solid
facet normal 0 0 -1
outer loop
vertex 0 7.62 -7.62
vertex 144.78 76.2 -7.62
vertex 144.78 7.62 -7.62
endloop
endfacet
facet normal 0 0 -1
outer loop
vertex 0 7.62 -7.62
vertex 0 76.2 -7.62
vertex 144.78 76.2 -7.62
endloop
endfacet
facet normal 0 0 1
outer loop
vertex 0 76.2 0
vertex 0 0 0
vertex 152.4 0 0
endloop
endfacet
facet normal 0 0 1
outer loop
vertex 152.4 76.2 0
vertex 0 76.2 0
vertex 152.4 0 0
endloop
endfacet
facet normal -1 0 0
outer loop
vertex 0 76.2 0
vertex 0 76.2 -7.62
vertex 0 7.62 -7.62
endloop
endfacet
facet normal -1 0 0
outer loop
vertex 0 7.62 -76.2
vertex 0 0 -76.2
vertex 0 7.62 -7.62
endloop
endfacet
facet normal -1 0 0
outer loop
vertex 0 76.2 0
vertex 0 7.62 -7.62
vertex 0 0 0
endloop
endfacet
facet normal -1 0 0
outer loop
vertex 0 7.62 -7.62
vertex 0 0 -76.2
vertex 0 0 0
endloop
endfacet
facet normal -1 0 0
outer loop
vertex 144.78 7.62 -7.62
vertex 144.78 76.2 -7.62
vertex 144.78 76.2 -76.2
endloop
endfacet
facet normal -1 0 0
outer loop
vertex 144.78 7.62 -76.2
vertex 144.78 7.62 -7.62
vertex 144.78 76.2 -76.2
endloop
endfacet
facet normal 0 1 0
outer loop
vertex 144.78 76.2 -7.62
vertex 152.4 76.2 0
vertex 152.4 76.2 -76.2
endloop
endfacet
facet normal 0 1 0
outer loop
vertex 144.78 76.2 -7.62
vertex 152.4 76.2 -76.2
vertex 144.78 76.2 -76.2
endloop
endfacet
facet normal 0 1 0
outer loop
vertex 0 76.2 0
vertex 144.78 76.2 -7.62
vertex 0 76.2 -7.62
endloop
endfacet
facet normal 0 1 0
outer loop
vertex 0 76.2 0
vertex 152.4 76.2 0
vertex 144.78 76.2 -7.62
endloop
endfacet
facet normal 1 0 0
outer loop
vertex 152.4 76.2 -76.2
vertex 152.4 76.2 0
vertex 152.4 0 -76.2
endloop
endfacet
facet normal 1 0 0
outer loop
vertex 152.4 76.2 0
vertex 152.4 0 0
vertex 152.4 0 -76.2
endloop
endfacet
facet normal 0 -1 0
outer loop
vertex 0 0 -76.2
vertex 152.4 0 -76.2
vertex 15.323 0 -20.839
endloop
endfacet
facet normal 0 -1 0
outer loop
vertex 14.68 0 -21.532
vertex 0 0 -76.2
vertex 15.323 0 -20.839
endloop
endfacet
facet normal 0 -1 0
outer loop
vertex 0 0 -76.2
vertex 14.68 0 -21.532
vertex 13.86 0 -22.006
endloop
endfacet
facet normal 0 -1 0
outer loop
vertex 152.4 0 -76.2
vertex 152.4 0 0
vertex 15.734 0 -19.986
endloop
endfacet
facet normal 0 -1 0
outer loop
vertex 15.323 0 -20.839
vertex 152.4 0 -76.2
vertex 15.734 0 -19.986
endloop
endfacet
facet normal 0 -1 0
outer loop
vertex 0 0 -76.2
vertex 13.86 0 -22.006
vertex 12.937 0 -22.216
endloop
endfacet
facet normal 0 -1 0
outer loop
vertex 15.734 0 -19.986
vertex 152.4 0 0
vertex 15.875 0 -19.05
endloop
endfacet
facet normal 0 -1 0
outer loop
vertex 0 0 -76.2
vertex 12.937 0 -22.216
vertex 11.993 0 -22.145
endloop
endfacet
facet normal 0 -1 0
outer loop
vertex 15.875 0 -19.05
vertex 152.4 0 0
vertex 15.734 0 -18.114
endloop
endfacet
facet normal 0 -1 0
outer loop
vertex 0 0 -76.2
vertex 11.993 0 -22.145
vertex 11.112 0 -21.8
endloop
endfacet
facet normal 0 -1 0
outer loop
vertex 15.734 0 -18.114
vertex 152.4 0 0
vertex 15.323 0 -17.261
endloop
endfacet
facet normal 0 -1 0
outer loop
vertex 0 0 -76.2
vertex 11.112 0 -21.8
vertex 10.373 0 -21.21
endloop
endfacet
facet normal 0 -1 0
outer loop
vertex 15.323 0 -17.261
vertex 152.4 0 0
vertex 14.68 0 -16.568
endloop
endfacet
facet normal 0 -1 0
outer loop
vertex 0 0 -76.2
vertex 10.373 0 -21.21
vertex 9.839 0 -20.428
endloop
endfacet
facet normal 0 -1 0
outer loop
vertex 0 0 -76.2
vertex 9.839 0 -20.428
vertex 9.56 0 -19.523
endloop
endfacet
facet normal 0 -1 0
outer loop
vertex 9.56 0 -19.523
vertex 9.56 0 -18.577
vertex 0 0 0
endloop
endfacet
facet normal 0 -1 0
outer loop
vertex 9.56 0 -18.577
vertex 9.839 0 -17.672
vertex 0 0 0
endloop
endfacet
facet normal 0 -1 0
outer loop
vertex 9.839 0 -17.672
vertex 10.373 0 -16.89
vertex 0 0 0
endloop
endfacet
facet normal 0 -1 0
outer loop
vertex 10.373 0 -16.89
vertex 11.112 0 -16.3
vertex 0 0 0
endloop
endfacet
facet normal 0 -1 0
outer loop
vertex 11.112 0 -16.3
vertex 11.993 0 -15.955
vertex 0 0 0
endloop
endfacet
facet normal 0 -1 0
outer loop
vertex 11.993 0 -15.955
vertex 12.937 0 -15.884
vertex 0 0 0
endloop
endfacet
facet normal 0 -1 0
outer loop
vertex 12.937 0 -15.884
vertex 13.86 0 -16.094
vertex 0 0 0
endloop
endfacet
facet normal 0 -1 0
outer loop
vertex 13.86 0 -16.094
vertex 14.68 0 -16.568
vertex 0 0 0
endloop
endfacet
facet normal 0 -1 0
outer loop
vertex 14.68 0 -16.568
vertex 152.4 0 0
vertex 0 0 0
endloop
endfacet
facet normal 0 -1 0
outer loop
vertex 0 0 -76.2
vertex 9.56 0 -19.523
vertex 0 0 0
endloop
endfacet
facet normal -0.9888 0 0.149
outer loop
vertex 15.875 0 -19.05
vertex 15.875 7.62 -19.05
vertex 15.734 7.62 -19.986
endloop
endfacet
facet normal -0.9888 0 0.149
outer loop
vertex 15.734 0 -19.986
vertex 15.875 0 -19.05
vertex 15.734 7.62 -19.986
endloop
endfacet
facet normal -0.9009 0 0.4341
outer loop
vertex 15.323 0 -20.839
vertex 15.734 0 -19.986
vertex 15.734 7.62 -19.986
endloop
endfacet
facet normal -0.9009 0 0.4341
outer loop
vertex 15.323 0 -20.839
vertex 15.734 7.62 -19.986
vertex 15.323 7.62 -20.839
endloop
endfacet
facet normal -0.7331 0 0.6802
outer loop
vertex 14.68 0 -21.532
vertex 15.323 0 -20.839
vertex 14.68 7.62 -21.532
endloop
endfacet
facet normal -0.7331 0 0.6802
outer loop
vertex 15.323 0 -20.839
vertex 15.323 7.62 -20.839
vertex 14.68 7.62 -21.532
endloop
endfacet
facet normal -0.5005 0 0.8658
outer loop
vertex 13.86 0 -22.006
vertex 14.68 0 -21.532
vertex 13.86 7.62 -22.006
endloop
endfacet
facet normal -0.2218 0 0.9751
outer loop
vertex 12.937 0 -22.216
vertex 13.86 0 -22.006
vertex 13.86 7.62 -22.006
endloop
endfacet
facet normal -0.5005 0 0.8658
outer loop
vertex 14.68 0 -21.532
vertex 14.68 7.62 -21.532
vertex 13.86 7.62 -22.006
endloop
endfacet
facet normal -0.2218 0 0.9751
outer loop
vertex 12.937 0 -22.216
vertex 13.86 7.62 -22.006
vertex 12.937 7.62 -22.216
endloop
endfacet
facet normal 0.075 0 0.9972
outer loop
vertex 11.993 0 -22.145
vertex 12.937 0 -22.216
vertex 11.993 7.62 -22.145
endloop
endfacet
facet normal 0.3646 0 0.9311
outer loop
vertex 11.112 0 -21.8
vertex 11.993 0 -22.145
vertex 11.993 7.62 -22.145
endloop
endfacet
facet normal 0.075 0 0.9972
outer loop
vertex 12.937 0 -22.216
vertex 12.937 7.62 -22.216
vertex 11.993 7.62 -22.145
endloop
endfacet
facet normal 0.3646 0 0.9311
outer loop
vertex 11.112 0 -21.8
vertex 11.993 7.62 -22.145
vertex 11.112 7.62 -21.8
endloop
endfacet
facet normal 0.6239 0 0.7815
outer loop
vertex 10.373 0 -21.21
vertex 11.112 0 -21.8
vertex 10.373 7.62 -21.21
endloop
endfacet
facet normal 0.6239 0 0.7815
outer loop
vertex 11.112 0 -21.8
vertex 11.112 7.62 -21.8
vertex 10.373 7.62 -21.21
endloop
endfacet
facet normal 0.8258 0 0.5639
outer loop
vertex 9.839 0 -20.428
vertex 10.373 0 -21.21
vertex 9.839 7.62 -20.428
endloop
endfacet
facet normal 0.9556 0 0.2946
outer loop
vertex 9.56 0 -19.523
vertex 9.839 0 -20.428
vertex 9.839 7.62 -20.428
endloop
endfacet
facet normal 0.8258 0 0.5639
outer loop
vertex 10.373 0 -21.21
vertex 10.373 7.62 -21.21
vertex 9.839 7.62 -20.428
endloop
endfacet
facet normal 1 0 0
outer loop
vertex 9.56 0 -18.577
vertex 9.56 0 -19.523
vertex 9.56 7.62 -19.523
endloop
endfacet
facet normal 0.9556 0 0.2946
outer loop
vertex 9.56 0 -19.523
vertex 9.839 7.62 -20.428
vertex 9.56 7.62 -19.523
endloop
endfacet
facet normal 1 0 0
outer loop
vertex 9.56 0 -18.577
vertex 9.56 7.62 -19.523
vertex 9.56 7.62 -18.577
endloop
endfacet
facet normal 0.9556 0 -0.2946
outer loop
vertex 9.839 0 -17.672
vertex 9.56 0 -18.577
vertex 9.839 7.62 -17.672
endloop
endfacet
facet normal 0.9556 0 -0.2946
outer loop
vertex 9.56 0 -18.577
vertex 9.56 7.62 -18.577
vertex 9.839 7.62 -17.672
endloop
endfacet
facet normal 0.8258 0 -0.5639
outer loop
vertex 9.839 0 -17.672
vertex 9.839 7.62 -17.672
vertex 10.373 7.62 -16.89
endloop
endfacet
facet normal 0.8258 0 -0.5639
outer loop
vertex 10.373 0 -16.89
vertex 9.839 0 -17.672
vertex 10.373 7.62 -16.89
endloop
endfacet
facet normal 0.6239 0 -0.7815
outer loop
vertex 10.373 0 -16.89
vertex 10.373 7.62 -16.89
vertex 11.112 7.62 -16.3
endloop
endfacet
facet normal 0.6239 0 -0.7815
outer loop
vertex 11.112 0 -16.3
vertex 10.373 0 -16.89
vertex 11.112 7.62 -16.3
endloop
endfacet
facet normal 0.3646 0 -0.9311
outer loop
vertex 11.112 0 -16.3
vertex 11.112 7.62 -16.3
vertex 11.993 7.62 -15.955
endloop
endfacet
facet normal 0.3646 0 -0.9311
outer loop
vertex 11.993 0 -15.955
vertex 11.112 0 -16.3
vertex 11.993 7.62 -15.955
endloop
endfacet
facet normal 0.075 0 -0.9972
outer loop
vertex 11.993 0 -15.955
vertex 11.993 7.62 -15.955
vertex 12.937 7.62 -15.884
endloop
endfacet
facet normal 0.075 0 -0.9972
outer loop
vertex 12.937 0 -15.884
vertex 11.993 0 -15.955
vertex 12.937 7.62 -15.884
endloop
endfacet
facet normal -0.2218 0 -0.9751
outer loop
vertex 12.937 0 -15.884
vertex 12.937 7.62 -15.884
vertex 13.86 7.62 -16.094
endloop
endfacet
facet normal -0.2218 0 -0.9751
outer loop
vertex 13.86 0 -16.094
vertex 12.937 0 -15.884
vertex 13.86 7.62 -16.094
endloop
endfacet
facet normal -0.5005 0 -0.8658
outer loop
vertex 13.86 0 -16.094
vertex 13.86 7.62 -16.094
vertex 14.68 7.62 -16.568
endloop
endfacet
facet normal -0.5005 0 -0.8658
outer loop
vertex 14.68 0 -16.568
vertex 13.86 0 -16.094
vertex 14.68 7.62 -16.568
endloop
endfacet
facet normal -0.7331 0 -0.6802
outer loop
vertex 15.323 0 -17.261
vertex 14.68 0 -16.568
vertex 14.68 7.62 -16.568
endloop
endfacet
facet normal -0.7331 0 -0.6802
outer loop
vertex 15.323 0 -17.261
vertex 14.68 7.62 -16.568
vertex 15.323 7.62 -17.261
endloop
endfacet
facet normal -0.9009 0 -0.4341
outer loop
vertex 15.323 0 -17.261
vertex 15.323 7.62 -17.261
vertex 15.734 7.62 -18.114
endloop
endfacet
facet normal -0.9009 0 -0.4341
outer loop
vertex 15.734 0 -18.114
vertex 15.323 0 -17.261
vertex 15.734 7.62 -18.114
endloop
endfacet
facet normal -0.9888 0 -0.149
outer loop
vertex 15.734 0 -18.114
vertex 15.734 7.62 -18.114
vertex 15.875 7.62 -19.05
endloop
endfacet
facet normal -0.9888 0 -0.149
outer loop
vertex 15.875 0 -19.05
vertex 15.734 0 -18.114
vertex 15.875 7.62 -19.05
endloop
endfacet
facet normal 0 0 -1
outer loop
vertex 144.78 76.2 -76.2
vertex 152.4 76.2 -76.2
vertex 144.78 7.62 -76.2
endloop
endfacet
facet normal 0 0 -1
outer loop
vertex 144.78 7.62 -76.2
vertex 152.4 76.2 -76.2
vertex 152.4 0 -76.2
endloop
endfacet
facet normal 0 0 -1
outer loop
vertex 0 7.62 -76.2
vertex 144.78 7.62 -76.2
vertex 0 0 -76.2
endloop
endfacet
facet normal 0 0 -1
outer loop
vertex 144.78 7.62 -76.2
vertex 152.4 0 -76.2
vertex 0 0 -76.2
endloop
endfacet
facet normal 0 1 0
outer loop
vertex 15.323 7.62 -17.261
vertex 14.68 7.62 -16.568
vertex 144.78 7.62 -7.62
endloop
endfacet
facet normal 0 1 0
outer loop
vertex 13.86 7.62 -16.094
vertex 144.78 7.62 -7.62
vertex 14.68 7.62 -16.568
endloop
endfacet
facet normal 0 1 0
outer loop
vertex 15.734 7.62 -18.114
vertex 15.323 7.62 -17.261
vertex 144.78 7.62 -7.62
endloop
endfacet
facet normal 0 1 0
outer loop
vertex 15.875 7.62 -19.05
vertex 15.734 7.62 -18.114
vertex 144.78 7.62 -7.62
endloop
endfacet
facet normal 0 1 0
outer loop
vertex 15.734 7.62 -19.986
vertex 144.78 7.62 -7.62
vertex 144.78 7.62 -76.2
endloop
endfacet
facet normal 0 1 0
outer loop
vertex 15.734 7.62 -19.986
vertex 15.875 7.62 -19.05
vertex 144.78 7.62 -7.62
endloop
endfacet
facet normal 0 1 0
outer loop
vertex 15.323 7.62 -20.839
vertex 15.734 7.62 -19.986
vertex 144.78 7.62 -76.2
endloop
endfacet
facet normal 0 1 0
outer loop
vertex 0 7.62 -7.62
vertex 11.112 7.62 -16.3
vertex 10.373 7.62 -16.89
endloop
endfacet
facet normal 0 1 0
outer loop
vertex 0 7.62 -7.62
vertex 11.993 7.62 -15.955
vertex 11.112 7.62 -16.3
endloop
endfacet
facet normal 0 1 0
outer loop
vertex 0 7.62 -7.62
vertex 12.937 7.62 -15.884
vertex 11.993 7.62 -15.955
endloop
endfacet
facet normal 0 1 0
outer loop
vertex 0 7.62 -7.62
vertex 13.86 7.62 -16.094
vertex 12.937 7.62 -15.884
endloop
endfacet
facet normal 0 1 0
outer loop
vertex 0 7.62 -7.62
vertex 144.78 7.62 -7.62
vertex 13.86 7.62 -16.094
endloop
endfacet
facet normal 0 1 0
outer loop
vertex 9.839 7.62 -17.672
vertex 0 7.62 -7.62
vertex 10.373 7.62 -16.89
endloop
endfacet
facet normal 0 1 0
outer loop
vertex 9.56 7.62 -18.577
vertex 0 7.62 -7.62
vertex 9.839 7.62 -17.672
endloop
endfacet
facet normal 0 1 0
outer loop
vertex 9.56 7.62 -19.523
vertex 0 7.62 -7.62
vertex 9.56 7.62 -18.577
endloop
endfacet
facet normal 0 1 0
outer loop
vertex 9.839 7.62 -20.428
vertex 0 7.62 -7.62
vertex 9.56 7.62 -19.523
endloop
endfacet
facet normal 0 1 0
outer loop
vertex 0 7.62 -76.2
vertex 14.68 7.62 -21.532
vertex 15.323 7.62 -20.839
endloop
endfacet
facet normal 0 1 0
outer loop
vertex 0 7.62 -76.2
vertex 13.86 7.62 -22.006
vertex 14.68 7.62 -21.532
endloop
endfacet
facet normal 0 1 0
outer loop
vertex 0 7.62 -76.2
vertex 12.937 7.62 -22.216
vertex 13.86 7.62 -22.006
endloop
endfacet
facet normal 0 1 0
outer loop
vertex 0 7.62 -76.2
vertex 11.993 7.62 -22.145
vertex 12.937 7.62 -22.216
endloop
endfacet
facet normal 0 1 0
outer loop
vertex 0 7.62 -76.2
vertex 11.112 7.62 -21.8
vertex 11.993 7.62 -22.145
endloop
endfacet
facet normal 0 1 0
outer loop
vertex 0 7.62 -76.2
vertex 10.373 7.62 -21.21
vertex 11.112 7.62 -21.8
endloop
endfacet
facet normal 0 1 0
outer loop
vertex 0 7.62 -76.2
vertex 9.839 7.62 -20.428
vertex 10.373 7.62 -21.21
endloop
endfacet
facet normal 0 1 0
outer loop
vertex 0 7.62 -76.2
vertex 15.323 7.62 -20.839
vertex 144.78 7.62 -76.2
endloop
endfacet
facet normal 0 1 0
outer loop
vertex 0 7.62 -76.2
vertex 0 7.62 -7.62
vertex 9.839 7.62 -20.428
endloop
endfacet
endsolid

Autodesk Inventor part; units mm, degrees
ref_plane "YZ Plane" through (0, 0, 0) normal (1, 0, 0) x (0, 1, 0)
ref_plane "XZ Plane" through (0, 0, 0) normal (0, 1, 0) x (-1, 0, 0)
ref_plane "XY Plane" through (0, 0, 0) normal (0, 0, 1) x (1, 0, 0)
sketch "Sketch1" plane through (0, 0, 0) normal (0, 1, 0) x (-1, 0, 0)
  line L0 (0, 0) -> (-152.4, 0)
  line L1 (-152.4, 0) -> (-152.4, -76.2)
  line L2 (-152.4, -76.2) -> (0, -76.2)
  line L3 (0, -76.2) -> (0, 0)
  dimension "d0" = 152.4
  dimension "d1" = 76.2
extrude "Extrusion1" add sketch "Sketch1" along normal blind 76.2
shell "Shell1" thickness 7.62 removed faces 1 at (101.6, 76.2, -25.4)
sketch "Sketch2" plane through (0, 0, -76.2) normal (-1, 0, 0) x (0, 0, 1)
  line L0 (0, 0) -> (0, 76.2) projected
  line L1 (0, 76.2) -> (68.58, 76.2)
  line L2 (68.58, 76.2) -> (68.58, 7.62)
  line L3 (68.58, 7.62) -> (0, 7.62)
  line L4 (0, 7.62) -> (0, 76.2)
  line L5 (0, 0) -> (76.2, 0) projected
  line L6 (76.2, 0) -> (76.2, 76.2) projected
  point P0 (7.62, 76.2)
  dimension "d5" = 7.62
  dimension "d6" = 7.62
  dimension "d7" = 7.62
extrude "Extrusion2" cut sketch "Sketch2" against normal up to surface (144.78 mm away)
sketch "Sketch3" plane through (0, 7.62, -7.62) normal (0, 1, 0) x (1, 0, 0)
  circle A0 centre (12.7, 11.43) radius 3.175
  line L0 (0, 0) -> (0, 68.58) projected
  line L1 (0, -7.62) -> (152.4, -7.62) projected
  dimension "d10" = 6.35
  dimension "d11" = 12.7
  dimension "d12" = 19.05
extrude "Extrusion3" cut sketch "Sketch3" against normal blind 25.4
properties part number "lift box"
